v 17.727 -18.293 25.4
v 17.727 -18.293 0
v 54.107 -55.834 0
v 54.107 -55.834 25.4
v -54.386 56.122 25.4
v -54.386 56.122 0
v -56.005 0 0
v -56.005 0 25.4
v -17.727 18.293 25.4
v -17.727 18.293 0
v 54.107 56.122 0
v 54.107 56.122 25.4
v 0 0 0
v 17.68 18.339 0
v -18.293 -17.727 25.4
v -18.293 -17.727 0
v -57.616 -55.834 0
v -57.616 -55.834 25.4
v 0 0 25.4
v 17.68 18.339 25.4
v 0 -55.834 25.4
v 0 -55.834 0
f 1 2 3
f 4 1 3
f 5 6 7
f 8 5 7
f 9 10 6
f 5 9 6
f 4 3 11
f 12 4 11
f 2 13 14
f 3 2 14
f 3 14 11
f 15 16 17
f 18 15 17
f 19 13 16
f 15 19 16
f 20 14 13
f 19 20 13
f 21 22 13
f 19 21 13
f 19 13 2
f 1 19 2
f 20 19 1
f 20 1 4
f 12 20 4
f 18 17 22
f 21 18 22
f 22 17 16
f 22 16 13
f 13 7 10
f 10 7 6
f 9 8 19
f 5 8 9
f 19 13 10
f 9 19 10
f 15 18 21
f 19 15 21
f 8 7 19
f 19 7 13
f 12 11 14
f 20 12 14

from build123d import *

# Parameters (mm, degrees)
F1_DEPTH = 25.4


with BuildPart() as f1:
    # F0 (on Top) → F1 (new body)
    with BuildSketch(Plane.XY):
        with BuildLine():
            ThreePointArc((-25.4736543276, 0), (-23.4573115433, 9.9328545727), (-17.7274865659, 18.2932579072))
            Line((-17.7274865659, 18.2932579072), (-54.3863869283, 56.1221241951))
            Line((-54.3863869283, 56.1221241951), (-56.0054767745, 0))
            Line((-56.0054767745, 0), (-25.4736543276, 0))
        make_face()
        with BuildLine():
            Line((-25.4736543276, 0), (0, 0))
            Line((0, 0), (-17.7274865659, 18.2932579072))
            ThreePointArc((-17.7274865659, 18.2932579072), (-23.4573115433, 9.9328545727), (-25.4736543276, 0))
        make_face()
    extrude(amount=F1_DEPTH)


with BuildPart() as f1b:
    # F0 (on Top) → F1, piece 2 (new body)
    with BuildSketch(Plane.XY):
        with BuildLine():
            ThreePointArc((17.7274865659, -18.2932579072), (23.4573115433, -9.9328545727), (25.4736543276, 0))
            Line((25.4736543276, 0), (0, 0))
            Line((0, 0), (17.7274865659, -18.2932579072))
        make_face()
        with BuildLine():
            Line((54.1074797511, 0), (25.4736543276, 0))
            ThreePointArc((25.4736543276, 0), (23.4573115433, -9.9328545727), (17.7274865659, -18.2932579072))
            Line((17.7274865659, -18.2932579072), (54.1074797511, -55.8343157172))
            Line((54.1074797511, -55.8343157172), (54.1074797511, 0))
        make_face()
        with BuildLine():
            Line((0, 0), (25.4736543276, 0))
            ThreePointArc((25.4736543276, 0), (23.444532262, 9.9629800673), (17.6804283896, 18.3387435983))
            Line((17.6804283896, 18.3387435983), (0, 0))
        make_face()
        with BuildLine():
            ThreePointArc((17.6804283896, 18.3387435983), (23.444532262, 9.9629800673), (25.4736543276, 0))
            Line((25.4736543276, 0), (54.1074797511, 0))
            Line((54.1074797511, 0), (54.1074797511, 56.1221241951))
            Line((54.1074797511, 56.1221241951), (17.6804283896, 18.3387435983))
        make_face()
    extrude(amount=F1_DEPTH)


with BuildPart() as f1c:
    # F0 (on Top) → F1, piece 3 (new body)
    with BuildSketch(Plane.XY):
        with BuildLine():
            Line((0, -25.4736543276), (0, 0))
            Line((0, 0), (-18.2932579072, -17.7274865659))
            ThreePointArc((-18.2932579072, -17.7274865659), (-9.9328545727, -23.4573115433), (0, -25.4736543276))
        make_face()
        with BuildLine():
            Line((0, -55.8343157172), (0, -25.4736543276))
            ThreePointArc((0, -25.4736543276), (-9.9328545727, -23.4573115433), (-18.2932579072, -17.7274865659))
            Line((-18.2932579072, -17.7274865659), (-57.6162635175, -55.8343157172))
            Line((-57.6162635175, -55.8343157172), (0, -55.8343157172))
        make_face()
    extrude(amount=F1_DEPTH)


solid = Compound([f1.part, f1b.part, f1c.part])
